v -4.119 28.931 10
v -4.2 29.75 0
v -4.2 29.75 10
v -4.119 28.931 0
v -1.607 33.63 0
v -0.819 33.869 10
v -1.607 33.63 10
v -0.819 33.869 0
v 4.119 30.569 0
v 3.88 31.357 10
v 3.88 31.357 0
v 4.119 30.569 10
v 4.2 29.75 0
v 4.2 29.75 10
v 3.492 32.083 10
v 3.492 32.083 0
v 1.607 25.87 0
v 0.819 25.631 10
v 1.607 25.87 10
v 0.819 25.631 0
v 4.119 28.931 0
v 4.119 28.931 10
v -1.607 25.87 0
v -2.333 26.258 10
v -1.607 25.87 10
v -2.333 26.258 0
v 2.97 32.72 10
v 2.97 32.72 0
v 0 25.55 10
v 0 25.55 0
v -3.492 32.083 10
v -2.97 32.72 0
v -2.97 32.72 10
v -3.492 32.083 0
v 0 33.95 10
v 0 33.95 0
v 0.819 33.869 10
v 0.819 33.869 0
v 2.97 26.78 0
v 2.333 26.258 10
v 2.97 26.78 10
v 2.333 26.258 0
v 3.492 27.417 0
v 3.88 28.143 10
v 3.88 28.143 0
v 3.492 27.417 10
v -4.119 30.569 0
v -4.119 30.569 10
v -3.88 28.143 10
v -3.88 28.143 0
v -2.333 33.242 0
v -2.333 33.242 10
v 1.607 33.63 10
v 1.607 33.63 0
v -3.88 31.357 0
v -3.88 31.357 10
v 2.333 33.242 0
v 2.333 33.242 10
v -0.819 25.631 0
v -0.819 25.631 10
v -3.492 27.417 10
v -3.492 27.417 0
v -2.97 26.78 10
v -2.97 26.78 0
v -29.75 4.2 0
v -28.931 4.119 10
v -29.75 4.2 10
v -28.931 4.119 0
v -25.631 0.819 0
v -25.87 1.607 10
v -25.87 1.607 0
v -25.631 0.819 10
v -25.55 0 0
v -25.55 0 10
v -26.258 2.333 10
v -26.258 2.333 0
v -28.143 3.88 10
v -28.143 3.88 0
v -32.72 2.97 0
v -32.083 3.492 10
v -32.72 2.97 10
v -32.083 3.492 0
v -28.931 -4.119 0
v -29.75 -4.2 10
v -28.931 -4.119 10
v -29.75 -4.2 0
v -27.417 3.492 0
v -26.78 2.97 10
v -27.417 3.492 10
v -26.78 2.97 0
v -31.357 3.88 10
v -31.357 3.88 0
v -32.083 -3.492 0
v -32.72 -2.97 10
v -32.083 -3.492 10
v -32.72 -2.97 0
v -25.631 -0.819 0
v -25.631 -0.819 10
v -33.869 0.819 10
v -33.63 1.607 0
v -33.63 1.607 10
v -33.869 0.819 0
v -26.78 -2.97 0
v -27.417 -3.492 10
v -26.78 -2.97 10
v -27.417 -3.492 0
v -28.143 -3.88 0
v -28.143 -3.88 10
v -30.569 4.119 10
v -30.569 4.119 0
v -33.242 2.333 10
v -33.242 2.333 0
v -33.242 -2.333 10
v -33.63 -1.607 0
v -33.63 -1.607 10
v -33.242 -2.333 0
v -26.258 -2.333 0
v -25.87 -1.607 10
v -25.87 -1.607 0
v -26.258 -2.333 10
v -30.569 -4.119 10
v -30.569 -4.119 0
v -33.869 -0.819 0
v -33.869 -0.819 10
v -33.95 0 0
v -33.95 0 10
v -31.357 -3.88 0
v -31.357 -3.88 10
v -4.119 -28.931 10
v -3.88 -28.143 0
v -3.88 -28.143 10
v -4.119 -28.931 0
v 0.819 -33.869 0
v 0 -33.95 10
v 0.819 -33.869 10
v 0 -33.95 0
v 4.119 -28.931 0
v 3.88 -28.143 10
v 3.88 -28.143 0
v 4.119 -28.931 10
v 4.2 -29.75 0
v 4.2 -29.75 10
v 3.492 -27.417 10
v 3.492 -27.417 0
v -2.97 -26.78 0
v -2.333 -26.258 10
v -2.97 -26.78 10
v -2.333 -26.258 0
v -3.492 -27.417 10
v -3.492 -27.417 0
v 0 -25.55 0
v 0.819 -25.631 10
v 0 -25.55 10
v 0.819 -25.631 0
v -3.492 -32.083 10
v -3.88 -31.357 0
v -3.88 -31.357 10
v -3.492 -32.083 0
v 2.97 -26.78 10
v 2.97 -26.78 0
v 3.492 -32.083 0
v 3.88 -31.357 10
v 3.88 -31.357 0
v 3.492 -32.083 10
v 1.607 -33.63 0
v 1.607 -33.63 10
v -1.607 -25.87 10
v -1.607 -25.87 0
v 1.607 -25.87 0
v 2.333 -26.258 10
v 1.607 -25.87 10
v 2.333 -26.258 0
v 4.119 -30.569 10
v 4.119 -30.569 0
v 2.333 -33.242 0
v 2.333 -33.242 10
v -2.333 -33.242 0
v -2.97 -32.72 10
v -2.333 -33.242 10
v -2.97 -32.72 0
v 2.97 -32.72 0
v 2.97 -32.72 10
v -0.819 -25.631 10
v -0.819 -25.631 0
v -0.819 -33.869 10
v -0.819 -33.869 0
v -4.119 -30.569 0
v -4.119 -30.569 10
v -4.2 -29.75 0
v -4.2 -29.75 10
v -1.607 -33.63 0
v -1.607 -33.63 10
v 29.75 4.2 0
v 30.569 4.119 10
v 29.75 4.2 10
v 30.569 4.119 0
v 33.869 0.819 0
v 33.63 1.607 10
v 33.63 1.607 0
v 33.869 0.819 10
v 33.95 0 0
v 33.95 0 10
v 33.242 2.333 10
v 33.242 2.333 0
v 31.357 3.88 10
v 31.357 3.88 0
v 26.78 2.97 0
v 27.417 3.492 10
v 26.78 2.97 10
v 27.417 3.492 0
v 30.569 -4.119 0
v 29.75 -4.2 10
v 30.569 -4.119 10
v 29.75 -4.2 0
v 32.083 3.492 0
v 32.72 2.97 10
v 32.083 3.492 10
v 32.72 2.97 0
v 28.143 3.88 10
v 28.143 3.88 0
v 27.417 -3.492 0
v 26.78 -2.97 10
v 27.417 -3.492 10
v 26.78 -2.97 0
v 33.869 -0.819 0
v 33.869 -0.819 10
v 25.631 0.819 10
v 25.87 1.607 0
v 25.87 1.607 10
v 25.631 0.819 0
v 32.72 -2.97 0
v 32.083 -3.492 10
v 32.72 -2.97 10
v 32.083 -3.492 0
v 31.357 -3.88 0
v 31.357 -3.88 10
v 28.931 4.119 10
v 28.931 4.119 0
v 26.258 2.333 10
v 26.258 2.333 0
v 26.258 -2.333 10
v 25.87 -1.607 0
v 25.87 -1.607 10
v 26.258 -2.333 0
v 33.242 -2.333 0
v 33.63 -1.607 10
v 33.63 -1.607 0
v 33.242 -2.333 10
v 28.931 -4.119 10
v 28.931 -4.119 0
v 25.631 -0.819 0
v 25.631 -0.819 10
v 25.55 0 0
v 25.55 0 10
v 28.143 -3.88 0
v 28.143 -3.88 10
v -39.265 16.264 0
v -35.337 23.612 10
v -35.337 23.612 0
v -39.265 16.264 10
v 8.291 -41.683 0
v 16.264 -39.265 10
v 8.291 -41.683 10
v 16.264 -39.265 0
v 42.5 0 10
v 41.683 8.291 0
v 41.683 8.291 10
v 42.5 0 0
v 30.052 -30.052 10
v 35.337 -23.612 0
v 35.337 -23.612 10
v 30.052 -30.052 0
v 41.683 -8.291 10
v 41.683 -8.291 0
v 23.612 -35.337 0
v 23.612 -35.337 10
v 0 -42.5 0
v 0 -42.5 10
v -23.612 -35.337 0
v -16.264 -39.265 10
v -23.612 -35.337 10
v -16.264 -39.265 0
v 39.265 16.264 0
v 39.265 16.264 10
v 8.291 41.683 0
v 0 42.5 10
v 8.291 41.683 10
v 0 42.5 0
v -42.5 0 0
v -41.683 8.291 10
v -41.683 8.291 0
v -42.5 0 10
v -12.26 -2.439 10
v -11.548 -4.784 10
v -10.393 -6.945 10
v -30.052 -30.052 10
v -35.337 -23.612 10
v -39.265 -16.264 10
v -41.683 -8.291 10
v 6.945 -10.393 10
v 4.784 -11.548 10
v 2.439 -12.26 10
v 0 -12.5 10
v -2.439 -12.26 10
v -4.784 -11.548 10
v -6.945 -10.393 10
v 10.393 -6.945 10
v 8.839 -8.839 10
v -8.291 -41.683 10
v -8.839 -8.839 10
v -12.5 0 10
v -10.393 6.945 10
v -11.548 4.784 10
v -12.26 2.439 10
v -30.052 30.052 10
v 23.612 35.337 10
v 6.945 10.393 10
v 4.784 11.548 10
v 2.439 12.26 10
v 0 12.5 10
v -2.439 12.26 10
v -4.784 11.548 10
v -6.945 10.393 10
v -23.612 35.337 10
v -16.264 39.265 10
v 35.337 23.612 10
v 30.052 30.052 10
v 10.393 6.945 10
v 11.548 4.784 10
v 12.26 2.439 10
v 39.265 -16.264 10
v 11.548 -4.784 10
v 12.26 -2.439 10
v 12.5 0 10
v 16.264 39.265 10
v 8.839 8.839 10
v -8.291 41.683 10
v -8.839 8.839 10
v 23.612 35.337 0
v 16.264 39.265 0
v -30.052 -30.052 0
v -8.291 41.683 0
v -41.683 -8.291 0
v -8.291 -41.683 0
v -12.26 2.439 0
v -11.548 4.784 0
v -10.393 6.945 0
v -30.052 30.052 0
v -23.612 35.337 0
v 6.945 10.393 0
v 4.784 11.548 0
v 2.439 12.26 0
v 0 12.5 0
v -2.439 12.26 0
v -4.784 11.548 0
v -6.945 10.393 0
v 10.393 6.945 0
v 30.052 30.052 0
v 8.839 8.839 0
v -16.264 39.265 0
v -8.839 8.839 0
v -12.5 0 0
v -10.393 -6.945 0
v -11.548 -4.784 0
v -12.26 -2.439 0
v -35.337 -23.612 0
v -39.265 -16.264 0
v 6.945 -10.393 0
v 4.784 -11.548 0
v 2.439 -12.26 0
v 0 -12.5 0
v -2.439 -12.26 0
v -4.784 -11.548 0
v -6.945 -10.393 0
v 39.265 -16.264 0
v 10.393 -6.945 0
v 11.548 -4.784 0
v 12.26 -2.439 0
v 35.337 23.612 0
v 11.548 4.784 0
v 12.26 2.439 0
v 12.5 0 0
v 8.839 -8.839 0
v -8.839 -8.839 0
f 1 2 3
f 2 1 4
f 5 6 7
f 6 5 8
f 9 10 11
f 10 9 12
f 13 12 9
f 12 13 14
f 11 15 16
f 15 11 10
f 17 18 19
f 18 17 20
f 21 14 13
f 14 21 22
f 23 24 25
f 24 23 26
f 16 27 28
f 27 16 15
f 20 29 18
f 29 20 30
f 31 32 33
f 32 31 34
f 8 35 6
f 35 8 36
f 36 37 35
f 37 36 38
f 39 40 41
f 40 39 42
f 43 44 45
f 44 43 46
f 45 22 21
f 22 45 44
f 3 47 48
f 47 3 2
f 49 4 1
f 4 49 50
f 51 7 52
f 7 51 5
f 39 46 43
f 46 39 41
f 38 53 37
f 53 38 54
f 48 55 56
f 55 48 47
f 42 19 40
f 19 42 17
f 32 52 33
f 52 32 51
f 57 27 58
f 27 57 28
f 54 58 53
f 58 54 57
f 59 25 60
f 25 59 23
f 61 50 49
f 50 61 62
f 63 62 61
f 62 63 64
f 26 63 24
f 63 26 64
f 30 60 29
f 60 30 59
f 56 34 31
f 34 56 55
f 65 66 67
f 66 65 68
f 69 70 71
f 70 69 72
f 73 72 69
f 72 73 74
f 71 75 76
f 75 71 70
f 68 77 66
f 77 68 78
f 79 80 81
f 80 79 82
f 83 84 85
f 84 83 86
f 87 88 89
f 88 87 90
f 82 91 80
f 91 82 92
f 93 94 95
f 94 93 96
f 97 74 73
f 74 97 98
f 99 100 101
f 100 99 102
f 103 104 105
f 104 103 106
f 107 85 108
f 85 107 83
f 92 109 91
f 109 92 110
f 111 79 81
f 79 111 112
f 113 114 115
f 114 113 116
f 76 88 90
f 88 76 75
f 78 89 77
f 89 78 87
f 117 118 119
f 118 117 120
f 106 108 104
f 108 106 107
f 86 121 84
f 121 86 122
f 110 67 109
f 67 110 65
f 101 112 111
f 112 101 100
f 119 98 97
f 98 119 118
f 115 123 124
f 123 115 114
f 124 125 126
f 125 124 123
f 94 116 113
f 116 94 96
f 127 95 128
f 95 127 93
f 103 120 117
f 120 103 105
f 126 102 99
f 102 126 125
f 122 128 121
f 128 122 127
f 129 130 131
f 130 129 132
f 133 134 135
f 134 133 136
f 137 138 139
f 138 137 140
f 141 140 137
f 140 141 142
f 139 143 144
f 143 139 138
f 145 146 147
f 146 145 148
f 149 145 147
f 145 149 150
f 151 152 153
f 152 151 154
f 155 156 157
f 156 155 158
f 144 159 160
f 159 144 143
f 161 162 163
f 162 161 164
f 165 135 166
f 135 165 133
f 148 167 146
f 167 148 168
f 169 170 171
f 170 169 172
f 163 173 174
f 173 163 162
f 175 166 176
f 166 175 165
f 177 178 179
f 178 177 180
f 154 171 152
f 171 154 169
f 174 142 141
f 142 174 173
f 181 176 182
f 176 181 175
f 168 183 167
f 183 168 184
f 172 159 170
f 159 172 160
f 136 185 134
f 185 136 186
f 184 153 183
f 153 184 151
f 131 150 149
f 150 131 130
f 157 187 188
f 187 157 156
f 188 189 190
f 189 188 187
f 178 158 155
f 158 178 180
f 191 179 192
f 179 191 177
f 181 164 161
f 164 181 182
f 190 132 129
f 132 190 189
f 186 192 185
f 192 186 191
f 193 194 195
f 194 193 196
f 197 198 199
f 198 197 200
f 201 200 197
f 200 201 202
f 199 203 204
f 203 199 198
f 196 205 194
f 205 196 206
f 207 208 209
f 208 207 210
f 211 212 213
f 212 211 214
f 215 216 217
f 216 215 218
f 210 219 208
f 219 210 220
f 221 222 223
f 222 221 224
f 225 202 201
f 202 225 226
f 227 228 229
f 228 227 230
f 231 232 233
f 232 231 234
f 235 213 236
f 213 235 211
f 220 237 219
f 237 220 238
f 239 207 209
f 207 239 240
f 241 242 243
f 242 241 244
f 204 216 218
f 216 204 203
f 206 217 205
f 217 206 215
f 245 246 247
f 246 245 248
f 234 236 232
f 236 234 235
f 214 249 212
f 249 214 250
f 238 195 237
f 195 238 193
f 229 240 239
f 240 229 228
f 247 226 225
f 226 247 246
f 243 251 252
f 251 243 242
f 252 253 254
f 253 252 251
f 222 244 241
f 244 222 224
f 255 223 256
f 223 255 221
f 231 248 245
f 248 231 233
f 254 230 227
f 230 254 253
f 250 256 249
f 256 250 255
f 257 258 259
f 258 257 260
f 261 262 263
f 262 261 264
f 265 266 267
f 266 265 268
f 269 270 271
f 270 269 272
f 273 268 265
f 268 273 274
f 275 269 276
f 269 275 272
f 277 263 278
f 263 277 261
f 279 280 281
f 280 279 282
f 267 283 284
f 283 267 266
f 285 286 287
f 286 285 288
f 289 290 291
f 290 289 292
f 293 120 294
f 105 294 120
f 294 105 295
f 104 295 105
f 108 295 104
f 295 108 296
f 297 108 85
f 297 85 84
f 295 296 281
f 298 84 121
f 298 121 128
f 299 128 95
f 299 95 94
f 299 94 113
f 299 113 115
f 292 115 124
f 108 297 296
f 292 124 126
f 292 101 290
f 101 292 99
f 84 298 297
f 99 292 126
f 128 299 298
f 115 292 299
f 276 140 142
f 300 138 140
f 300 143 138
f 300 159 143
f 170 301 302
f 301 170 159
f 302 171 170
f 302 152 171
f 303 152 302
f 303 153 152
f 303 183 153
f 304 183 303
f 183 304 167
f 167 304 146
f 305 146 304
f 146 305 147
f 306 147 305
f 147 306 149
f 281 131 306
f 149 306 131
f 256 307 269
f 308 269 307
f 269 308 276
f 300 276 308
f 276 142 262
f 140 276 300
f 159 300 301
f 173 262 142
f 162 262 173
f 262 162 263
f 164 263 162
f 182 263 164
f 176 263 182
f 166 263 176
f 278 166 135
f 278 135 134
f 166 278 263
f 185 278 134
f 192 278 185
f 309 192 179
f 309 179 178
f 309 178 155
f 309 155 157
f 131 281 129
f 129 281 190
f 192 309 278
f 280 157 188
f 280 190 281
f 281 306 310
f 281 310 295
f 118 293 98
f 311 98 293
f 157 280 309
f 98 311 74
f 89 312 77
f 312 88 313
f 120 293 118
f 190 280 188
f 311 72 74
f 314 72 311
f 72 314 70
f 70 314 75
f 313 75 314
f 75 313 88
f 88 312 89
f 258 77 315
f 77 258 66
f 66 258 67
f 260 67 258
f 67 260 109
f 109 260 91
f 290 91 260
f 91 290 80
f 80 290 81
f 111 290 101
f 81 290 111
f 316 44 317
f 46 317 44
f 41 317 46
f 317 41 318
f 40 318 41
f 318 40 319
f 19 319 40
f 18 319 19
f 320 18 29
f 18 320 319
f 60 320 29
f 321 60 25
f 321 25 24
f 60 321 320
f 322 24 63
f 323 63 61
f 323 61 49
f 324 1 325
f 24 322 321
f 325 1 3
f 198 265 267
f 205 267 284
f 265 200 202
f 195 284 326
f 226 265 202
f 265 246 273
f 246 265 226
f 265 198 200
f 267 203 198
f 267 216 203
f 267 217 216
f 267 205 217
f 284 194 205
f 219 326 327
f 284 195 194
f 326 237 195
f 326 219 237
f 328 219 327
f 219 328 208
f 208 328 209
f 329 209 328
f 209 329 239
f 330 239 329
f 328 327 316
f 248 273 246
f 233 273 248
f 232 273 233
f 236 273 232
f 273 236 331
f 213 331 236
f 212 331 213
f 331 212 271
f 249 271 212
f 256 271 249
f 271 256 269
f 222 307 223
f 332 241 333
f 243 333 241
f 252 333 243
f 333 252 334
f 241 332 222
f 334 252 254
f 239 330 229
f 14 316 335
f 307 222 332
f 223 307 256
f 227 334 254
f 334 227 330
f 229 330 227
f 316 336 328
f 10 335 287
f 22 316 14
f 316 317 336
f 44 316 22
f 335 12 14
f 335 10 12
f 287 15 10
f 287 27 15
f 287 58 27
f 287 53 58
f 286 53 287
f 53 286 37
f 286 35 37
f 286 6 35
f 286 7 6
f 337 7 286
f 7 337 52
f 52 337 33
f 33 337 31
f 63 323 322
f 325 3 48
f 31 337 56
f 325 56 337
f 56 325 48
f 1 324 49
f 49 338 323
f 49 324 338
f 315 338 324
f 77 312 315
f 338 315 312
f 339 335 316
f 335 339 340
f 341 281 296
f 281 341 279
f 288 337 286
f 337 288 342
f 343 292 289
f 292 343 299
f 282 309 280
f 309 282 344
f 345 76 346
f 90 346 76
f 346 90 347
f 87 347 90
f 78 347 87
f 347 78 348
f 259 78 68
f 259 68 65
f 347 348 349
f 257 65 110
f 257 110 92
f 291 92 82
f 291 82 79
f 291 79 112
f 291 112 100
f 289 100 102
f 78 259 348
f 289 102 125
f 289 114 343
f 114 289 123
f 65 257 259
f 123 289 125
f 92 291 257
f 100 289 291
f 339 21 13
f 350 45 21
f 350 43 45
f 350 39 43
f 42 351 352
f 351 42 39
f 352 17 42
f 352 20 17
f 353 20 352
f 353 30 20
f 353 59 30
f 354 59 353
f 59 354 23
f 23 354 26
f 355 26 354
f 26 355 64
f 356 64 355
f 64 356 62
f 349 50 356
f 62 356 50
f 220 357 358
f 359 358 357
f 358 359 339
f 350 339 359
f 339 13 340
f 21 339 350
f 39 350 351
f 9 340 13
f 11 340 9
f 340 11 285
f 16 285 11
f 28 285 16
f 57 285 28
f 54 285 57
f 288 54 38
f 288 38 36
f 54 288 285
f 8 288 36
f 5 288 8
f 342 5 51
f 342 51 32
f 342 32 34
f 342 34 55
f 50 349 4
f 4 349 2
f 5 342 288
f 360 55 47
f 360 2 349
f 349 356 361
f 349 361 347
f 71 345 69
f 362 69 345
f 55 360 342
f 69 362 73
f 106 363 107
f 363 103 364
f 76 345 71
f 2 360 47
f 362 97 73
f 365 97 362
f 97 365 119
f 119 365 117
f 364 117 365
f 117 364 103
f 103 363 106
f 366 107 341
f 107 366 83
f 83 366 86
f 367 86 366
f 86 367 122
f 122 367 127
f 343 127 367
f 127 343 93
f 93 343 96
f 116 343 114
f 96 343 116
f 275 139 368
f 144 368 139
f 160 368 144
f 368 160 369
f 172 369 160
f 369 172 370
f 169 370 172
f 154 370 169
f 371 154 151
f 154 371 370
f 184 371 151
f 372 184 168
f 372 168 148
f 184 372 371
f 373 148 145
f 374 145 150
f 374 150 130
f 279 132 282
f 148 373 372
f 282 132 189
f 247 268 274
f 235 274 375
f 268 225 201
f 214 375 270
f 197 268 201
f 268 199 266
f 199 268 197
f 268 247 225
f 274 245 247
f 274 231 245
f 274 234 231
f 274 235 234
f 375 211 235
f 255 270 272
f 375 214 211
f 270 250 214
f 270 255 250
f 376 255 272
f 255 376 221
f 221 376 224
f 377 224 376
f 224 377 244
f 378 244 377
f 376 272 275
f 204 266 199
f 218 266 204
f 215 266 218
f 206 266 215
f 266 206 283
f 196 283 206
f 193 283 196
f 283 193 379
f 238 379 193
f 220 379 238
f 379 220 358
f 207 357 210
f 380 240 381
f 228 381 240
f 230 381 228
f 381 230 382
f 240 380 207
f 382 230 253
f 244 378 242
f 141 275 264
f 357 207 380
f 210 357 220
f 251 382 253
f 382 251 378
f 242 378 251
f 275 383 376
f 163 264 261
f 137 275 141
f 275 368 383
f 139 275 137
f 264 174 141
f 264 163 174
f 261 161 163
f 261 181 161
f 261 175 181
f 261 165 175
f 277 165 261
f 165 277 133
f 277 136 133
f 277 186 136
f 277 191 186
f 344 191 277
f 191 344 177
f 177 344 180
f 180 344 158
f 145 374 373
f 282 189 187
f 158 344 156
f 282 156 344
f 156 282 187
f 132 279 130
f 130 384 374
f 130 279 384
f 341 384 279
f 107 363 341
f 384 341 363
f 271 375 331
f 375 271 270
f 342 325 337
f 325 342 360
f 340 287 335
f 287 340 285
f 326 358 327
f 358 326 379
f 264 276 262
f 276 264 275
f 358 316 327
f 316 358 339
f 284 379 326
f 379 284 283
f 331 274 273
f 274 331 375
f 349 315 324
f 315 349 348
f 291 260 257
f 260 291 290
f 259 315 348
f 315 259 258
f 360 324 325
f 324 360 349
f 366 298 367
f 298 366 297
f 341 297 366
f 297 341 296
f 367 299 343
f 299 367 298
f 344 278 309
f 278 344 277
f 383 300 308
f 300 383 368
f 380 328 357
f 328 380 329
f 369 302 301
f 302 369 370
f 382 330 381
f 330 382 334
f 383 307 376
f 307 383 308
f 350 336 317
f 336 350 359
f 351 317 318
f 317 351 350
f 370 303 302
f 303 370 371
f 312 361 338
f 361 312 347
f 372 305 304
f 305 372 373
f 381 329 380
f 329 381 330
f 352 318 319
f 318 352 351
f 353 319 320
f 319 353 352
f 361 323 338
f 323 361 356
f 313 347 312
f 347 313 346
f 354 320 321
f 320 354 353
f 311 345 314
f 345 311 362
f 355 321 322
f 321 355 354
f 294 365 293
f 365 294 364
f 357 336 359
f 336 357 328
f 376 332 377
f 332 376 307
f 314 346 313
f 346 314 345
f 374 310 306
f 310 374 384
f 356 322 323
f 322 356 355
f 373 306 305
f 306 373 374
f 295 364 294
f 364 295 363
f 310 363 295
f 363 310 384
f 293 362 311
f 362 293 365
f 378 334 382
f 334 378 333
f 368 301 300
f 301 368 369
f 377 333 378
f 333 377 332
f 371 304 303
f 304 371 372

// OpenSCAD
$fn = 32;

// ----------------------------------------------------------------------
// Flange Ø85 x 10
// 4 holes on a Ø59.5 bolt circle, bolted joints
// ----------------------------------------------------------------------

// --- parameters (mm) ---
flange_d = 85;   // outside diameter of the flange
thickness = 10;  // flange thickness
holes = 4;       // number of bolt holes
pcd = 59.5;      // bolt circle diameter
start_deg = 90;  // angle of the first hole, from +X
hole_d = 8.4;    // bolt hole diameter
bore_d = 25;     // central through bore
hub_d = 33;      // hub outside diameter
hub_h = 0;       // hub height above the flange face (0 = no hub)

// --- derived feature positions (mm) ---
height = thickness + hub_h;  // = 10   overall height of the part
pcd_r = pcd / 2;             // = 29.75   bolt circle radius
hole_step = 360 / holes;     // = 90   angular pitch
feature_centers = [
  [pcd_r * cos(start_deg + 0 * hole_step), pcd_r * sin(start_deg + 0 * hole_step)],
  [pcd_r * cos(start_deg + 1 * hole_step), pcd_r * sin(start_deg + 1 * hole_step)],
  [pcd_r * cos(start_deg + 2 * hole_step), pcd_r * sin(start_deg + 2 * hole_step)],
  [pcd_r * cos(start_deg + 3 * hole_step), pcd_r * sin(start_deg + 3 * hole_step)]
];   // bolt hole centres on the pitch circle

// flange disc, every hole and the bore cut straight through
difference() {
  union() {
    cylinder(d = flange_d, h = thickness);
  }
  translate([0, 0, -1]) cylinder(d = bore_d, h = height + 2);  // bore, through
  for (centre = feature_centers)
    translate([centre[0], centre[1], -1]) cylinder(d = hole_d, h = thickness + 2);
}
